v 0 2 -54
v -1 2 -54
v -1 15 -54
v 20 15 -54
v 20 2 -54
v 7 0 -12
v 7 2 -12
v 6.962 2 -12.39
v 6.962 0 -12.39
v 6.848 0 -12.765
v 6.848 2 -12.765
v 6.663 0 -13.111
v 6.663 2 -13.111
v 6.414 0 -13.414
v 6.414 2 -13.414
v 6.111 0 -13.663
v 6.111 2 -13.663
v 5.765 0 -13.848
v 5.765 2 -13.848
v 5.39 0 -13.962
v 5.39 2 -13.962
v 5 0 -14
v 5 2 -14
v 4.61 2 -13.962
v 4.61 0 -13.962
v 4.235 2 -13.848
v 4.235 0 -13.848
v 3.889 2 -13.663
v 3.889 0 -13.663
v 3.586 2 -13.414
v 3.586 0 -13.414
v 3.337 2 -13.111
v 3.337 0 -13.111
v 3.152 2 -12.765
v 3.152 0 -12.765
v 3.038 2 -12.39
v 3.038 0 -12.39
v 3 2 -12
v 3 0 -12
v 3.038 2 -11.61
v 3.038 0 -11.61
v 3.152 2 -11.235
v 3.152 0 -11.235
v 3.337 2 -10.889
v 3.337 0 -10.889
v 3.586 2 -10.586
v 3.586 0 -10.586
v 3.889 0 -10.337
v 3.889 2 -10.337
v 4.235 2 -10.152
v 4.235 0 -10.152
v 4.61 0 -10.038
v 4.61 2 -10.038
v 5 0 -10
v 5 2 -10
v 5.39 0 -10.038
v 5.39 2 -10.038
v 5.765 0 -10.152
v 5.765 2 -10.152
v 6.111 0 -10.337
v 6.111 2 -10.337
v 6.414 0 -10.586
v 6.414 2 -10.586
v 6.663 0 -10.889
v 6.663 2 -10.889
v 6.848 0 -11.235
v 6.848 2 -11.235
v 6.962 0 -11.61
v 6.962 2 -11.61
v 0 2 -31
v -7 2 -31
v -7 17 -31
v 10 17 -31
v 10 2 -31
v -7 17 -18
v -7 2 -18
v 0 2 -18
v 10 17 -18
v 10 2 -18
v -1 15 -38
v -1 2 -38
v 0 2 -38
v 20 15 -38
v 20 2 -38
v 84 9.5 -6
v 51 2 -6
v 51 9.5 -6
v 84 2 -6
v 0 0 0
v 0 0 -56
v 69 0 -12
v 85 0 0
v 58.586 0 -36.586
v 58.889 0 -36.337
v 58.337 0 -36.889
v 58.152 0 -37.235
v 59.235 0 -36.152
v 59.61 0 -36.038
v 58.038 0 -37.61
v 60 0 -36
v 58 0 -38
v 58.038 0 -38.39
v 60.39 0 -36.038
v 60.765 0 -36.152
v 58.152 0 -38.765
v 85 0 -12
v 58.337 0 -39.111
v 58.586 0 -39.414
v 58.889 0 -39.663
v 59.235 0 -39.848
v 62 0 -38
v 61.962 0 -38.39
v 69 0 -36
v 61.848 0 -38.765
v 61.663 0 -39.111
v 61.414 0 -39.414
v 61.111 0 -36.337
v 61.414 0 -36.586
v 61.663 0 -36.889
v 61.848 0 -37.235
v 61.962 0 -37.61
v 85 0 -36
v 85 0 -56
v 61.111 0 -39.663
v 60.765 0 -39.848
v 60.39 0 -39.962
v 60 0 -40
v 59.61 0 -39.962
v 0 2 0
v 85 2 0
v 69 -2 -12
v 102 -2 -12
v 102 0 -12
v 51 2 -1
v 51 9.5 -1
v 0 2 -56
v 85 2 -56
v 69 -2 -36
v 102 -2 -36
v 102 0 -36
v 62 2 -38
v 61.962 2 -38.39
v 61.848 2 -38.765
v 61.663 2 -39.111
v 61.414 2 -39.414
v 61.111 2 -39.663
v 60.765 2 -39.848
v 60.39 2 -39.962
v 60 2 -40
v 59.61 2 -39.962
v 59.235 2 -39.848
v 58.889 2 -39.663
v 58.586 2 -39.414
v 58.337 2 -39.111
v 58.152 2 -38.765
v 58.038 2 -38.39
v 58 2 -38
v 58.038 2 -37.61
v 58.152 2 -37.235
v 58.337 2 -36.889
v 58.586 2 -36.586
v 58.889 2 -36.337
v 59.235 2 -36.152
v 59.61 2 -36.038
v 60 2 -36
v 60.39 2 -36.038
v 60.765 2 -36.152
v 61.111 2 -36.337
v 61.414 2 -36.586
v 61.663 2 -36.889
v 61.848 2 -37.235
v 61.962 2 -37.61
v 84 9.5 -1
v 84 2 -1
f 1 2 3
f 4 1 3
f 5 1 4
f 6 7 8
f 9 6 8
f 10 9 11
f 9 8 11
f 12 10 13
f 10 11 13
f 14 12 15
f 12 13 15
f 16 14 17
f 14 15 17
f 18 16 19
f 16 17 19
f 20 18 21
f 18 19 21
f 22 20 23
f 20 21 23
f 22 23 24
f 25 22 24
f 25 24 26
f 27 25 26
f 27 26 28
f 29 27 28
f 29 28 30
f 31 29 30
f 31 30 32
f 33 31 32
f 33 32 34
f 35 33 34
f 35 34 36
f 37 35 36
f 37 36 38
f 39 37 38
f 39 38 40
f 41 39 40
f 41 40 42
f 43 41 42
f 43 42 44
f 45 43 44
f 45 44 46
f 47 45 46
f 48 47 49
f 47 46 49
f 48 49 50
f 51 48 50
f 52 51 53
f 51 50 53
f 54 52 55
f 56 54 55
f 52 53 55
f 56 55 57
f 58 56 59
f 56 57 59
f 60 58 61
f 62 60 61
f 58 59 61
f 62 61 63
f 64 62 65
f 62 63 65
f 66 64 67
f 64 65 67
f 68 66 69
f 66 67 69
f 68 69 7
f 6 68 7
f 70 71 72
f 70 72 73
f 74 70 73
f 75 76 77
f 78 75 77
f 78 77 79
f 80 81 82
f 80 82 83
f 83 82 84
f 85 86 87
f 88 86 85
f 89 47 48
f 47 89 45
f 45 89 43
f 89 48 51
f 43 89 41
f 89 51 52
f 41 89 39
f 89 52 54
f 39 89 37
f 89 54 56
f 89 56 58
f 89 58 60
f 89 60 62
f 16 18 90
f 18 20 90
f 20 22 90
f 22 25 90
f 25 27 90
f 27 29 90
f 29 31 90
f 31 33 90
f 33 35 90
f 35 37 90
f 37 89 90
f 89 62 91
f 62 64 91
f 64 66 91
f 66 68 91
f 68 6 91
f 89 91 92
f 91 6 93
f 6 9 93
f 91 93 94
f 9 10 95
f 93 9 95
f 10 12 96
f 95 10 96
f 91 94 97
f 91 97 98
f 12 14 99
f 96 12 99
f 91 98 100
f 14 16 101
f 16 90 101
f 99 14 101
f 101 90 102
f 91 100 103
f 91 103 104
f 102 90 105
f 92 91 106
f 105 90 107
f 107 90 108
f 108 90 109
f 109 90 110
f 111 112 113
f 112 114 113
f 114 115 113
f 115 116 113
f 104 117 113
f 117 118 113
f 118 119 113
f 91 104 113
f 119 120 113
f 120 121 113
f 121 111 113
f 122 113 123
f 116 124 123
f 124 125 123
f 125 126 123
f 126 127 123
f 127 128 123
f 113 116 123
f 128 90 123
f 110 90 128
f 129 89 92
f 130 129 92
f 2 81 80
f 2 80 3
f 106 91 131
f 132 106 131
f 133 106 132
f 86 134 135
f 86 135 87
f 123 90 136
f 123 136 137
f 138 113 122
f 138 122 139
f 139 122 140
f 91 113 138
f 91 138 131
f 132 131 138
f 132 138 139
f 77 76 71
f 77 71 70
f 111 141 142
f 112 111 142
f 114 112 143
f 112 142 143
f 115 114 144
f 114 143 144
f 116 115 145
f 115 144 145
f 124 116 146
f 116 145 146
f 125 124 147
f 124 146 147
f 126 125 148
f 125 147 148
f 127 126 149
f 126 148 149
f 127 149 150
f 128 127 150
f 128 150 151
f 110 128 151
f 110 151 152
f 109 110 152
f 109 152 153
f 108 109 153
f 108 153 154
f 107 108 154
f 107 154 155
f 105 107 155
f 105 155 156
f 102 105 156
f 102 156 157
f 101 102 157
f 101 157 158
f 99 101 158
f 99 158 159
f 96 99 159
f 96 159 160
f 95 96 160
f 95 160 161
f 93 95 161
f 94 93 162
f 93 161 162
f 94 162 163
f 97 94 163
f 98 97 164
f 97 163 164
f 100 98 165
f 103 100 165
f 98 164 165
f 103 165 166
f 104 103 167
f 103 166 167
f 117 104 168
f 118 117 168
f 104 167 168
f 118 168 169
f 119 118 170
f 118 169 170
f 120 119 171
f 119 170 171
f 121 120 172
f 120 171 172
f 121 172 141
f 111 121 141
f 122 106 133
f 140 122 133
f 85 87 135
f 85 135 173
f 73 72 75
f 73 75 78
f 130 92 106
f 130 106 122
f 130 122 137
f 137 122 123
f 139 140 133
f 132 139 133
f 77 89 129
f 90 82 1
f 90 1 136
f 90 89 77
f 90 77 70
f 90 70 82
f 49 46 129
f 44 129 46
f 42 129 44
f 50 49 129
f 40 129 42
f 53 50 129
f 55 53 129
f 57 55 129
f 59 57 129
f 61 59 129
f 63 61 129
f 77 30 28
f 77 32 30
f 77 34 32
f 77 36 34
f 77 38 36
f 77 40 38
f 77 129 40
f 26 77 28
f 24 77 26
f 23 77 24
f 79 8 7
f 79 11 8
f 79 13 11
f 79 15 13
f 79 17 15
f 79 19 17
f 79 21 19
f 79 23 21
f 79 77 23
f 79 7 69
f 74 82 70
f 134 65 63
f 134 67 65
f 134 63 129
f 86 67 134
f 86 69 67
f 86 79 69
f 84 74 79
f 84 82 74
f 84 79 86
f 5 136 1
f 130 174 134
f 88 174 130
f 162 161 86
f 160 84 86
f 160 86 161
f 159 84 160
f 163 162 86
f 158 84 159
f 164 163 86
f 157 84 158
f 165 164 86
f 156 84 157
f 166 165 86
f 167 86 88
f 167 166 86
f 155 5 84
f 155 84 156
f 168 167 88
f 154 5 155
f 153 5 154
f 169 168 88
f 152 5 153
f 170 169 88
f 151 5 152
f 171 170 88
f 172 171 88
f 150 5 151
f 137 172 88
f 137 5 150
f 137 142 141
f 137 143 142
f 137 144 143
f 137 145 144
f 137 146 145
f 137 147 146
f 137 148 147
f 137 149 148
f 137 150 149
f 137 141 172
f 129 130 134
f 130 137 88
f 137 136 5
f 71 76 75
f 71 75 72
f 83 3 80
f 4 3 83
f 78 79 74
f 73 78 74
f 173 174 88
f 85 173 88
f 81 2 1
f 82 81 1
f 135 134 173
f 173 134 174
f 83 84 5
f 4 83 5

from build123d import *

# Parameters (mm, degrees)
SKETCH1_W           = 85
SKETCH1_H           = 56
BOSS_EXTRUDE1_DEPTH = 2
SKETCH2_W           = 21
SKETCH2_H           = 16
BOSS_EXTRUDE2_DEPTH = 13
SKETCH3_W           = 17
SKETCH3_H           = 13
BOSS_EXTRUDE3_DEPTH = 15
SKETCH4_W           = 33
SKETCH4_H           = 24
BOSS_EXTRUDE4_DEPTH = 2
CUT_EXTRUDE1_REACH  = 6
SKETCH5_R           = 2
SKETCH6_W           = 33
SKETCH6_H           = 5
BOSS_EXTRUDE5_DEPTH = 7.5


with BuildPart() as part:
    # Sketch1 → Boss-Extrude1 (new body)
    with BuildSketch(Plane(origin=(0, 0, 0), x_dir=(1, 0, 0), z_dir=(0, 1, 0))):
        with Locations((42.5, 28)):
            Rectangle(SKETCH1_W, SKETCH1_H)
    extrude(amount=BOSS_EXTRUDE1_DEPTH)

    # Sketch2 → Boss-Extrude2 (add)
    with BuildSketch(Plane(origin=(0, 2, 0), x_dir=(1, 0, 0), z_dir=(0, 1, 0))):
        with Locations((9.5, 46)):
            Rectangle(SKETCH2_W, SKETCH2_H)
    extrude(amount=BOSS_EXTRUDE2_DEPTH)

    # Sketch3 → Boss-Extrude3 (add)
    with BuildSketch(Plane(origin=(0, 2, 0), x_dir=(1, 0, 0), z_dir=(0, 1, 0))):
        with Locations((1.5, 24.5)):
            Rectangle(SKETCH3_W, SKETCH3_H)
    extrude(amount=BOSS_EXTRUDE3_DEPTH)

    # Sketch4 → Boss-Extrude4 (add)
    with BuildSketch(Plane.XZ):
        with Locations((85.5, -24)):
            Rectangle(SKETCH4_W, SKETCH4_H)
    extrude(amount=BOSS_EXTRUDE4_DEPTH)

    # Sketch5 → Cut-Extrude1 (cut, up to next)
    with BuildSketch(Plane(origin=(0, 2, 0), x_dir=(1, 0, 0), z_dir=(0, 1, 0)), mode=Mode.PRIVATE) as cut_extrude1_sk1:
        with Locations((5, 12)):
            Circle(SKETCH5_R)
    cut_extrude1_tool1 = extrude(cut_extrude1_sk1.sketch, amount=-CUT_EXTRUDE1_REACH, mode=Mode.PRIVATE) & part.part
    add(cut_extrude1_tool1.solids().sort_by_distance((5, 2, -12))[0], mode=Mode.SUBTRACT)
    # Sketch5 → Cut-Extrude1 (cut, up to next)
    with BuildSketch(Plane(origin=(0, 2, 0), x_dir=(1, 0, 0), z_dir=(0, 1, 0)), mode=Mode.PRIVATE) as cut_extrude1_sk2:
        with Locations((60, 38)):
            Circle(SKETCH5_R)
    cut_extrude1_tool2 = extrude(cut_extrude1_sk2.sketch, amount=-CUT_EXTRUDE1_REACH, mode=Mode.PRIVATE) & part.part
    add(cut_extrude1_tool2.solids().sort_by_distance((60, 2, -38))[0], mode=Mode.SUBTRACT)

    # Sketch6 → Boss-Extrude5 (add)
    with BuildSketch(Plane(origin=(0, 2, 0), x_dir=(1, 0, 0), z_dir=(0, 1, 0))):
        with Locations((67.5, 3.5)):
            Rectangle(SKETCH6_W, SKETCH6_H)
    extrude(amount=BOSS_EXTRUDE5_DEPTH)


solid = part.part
